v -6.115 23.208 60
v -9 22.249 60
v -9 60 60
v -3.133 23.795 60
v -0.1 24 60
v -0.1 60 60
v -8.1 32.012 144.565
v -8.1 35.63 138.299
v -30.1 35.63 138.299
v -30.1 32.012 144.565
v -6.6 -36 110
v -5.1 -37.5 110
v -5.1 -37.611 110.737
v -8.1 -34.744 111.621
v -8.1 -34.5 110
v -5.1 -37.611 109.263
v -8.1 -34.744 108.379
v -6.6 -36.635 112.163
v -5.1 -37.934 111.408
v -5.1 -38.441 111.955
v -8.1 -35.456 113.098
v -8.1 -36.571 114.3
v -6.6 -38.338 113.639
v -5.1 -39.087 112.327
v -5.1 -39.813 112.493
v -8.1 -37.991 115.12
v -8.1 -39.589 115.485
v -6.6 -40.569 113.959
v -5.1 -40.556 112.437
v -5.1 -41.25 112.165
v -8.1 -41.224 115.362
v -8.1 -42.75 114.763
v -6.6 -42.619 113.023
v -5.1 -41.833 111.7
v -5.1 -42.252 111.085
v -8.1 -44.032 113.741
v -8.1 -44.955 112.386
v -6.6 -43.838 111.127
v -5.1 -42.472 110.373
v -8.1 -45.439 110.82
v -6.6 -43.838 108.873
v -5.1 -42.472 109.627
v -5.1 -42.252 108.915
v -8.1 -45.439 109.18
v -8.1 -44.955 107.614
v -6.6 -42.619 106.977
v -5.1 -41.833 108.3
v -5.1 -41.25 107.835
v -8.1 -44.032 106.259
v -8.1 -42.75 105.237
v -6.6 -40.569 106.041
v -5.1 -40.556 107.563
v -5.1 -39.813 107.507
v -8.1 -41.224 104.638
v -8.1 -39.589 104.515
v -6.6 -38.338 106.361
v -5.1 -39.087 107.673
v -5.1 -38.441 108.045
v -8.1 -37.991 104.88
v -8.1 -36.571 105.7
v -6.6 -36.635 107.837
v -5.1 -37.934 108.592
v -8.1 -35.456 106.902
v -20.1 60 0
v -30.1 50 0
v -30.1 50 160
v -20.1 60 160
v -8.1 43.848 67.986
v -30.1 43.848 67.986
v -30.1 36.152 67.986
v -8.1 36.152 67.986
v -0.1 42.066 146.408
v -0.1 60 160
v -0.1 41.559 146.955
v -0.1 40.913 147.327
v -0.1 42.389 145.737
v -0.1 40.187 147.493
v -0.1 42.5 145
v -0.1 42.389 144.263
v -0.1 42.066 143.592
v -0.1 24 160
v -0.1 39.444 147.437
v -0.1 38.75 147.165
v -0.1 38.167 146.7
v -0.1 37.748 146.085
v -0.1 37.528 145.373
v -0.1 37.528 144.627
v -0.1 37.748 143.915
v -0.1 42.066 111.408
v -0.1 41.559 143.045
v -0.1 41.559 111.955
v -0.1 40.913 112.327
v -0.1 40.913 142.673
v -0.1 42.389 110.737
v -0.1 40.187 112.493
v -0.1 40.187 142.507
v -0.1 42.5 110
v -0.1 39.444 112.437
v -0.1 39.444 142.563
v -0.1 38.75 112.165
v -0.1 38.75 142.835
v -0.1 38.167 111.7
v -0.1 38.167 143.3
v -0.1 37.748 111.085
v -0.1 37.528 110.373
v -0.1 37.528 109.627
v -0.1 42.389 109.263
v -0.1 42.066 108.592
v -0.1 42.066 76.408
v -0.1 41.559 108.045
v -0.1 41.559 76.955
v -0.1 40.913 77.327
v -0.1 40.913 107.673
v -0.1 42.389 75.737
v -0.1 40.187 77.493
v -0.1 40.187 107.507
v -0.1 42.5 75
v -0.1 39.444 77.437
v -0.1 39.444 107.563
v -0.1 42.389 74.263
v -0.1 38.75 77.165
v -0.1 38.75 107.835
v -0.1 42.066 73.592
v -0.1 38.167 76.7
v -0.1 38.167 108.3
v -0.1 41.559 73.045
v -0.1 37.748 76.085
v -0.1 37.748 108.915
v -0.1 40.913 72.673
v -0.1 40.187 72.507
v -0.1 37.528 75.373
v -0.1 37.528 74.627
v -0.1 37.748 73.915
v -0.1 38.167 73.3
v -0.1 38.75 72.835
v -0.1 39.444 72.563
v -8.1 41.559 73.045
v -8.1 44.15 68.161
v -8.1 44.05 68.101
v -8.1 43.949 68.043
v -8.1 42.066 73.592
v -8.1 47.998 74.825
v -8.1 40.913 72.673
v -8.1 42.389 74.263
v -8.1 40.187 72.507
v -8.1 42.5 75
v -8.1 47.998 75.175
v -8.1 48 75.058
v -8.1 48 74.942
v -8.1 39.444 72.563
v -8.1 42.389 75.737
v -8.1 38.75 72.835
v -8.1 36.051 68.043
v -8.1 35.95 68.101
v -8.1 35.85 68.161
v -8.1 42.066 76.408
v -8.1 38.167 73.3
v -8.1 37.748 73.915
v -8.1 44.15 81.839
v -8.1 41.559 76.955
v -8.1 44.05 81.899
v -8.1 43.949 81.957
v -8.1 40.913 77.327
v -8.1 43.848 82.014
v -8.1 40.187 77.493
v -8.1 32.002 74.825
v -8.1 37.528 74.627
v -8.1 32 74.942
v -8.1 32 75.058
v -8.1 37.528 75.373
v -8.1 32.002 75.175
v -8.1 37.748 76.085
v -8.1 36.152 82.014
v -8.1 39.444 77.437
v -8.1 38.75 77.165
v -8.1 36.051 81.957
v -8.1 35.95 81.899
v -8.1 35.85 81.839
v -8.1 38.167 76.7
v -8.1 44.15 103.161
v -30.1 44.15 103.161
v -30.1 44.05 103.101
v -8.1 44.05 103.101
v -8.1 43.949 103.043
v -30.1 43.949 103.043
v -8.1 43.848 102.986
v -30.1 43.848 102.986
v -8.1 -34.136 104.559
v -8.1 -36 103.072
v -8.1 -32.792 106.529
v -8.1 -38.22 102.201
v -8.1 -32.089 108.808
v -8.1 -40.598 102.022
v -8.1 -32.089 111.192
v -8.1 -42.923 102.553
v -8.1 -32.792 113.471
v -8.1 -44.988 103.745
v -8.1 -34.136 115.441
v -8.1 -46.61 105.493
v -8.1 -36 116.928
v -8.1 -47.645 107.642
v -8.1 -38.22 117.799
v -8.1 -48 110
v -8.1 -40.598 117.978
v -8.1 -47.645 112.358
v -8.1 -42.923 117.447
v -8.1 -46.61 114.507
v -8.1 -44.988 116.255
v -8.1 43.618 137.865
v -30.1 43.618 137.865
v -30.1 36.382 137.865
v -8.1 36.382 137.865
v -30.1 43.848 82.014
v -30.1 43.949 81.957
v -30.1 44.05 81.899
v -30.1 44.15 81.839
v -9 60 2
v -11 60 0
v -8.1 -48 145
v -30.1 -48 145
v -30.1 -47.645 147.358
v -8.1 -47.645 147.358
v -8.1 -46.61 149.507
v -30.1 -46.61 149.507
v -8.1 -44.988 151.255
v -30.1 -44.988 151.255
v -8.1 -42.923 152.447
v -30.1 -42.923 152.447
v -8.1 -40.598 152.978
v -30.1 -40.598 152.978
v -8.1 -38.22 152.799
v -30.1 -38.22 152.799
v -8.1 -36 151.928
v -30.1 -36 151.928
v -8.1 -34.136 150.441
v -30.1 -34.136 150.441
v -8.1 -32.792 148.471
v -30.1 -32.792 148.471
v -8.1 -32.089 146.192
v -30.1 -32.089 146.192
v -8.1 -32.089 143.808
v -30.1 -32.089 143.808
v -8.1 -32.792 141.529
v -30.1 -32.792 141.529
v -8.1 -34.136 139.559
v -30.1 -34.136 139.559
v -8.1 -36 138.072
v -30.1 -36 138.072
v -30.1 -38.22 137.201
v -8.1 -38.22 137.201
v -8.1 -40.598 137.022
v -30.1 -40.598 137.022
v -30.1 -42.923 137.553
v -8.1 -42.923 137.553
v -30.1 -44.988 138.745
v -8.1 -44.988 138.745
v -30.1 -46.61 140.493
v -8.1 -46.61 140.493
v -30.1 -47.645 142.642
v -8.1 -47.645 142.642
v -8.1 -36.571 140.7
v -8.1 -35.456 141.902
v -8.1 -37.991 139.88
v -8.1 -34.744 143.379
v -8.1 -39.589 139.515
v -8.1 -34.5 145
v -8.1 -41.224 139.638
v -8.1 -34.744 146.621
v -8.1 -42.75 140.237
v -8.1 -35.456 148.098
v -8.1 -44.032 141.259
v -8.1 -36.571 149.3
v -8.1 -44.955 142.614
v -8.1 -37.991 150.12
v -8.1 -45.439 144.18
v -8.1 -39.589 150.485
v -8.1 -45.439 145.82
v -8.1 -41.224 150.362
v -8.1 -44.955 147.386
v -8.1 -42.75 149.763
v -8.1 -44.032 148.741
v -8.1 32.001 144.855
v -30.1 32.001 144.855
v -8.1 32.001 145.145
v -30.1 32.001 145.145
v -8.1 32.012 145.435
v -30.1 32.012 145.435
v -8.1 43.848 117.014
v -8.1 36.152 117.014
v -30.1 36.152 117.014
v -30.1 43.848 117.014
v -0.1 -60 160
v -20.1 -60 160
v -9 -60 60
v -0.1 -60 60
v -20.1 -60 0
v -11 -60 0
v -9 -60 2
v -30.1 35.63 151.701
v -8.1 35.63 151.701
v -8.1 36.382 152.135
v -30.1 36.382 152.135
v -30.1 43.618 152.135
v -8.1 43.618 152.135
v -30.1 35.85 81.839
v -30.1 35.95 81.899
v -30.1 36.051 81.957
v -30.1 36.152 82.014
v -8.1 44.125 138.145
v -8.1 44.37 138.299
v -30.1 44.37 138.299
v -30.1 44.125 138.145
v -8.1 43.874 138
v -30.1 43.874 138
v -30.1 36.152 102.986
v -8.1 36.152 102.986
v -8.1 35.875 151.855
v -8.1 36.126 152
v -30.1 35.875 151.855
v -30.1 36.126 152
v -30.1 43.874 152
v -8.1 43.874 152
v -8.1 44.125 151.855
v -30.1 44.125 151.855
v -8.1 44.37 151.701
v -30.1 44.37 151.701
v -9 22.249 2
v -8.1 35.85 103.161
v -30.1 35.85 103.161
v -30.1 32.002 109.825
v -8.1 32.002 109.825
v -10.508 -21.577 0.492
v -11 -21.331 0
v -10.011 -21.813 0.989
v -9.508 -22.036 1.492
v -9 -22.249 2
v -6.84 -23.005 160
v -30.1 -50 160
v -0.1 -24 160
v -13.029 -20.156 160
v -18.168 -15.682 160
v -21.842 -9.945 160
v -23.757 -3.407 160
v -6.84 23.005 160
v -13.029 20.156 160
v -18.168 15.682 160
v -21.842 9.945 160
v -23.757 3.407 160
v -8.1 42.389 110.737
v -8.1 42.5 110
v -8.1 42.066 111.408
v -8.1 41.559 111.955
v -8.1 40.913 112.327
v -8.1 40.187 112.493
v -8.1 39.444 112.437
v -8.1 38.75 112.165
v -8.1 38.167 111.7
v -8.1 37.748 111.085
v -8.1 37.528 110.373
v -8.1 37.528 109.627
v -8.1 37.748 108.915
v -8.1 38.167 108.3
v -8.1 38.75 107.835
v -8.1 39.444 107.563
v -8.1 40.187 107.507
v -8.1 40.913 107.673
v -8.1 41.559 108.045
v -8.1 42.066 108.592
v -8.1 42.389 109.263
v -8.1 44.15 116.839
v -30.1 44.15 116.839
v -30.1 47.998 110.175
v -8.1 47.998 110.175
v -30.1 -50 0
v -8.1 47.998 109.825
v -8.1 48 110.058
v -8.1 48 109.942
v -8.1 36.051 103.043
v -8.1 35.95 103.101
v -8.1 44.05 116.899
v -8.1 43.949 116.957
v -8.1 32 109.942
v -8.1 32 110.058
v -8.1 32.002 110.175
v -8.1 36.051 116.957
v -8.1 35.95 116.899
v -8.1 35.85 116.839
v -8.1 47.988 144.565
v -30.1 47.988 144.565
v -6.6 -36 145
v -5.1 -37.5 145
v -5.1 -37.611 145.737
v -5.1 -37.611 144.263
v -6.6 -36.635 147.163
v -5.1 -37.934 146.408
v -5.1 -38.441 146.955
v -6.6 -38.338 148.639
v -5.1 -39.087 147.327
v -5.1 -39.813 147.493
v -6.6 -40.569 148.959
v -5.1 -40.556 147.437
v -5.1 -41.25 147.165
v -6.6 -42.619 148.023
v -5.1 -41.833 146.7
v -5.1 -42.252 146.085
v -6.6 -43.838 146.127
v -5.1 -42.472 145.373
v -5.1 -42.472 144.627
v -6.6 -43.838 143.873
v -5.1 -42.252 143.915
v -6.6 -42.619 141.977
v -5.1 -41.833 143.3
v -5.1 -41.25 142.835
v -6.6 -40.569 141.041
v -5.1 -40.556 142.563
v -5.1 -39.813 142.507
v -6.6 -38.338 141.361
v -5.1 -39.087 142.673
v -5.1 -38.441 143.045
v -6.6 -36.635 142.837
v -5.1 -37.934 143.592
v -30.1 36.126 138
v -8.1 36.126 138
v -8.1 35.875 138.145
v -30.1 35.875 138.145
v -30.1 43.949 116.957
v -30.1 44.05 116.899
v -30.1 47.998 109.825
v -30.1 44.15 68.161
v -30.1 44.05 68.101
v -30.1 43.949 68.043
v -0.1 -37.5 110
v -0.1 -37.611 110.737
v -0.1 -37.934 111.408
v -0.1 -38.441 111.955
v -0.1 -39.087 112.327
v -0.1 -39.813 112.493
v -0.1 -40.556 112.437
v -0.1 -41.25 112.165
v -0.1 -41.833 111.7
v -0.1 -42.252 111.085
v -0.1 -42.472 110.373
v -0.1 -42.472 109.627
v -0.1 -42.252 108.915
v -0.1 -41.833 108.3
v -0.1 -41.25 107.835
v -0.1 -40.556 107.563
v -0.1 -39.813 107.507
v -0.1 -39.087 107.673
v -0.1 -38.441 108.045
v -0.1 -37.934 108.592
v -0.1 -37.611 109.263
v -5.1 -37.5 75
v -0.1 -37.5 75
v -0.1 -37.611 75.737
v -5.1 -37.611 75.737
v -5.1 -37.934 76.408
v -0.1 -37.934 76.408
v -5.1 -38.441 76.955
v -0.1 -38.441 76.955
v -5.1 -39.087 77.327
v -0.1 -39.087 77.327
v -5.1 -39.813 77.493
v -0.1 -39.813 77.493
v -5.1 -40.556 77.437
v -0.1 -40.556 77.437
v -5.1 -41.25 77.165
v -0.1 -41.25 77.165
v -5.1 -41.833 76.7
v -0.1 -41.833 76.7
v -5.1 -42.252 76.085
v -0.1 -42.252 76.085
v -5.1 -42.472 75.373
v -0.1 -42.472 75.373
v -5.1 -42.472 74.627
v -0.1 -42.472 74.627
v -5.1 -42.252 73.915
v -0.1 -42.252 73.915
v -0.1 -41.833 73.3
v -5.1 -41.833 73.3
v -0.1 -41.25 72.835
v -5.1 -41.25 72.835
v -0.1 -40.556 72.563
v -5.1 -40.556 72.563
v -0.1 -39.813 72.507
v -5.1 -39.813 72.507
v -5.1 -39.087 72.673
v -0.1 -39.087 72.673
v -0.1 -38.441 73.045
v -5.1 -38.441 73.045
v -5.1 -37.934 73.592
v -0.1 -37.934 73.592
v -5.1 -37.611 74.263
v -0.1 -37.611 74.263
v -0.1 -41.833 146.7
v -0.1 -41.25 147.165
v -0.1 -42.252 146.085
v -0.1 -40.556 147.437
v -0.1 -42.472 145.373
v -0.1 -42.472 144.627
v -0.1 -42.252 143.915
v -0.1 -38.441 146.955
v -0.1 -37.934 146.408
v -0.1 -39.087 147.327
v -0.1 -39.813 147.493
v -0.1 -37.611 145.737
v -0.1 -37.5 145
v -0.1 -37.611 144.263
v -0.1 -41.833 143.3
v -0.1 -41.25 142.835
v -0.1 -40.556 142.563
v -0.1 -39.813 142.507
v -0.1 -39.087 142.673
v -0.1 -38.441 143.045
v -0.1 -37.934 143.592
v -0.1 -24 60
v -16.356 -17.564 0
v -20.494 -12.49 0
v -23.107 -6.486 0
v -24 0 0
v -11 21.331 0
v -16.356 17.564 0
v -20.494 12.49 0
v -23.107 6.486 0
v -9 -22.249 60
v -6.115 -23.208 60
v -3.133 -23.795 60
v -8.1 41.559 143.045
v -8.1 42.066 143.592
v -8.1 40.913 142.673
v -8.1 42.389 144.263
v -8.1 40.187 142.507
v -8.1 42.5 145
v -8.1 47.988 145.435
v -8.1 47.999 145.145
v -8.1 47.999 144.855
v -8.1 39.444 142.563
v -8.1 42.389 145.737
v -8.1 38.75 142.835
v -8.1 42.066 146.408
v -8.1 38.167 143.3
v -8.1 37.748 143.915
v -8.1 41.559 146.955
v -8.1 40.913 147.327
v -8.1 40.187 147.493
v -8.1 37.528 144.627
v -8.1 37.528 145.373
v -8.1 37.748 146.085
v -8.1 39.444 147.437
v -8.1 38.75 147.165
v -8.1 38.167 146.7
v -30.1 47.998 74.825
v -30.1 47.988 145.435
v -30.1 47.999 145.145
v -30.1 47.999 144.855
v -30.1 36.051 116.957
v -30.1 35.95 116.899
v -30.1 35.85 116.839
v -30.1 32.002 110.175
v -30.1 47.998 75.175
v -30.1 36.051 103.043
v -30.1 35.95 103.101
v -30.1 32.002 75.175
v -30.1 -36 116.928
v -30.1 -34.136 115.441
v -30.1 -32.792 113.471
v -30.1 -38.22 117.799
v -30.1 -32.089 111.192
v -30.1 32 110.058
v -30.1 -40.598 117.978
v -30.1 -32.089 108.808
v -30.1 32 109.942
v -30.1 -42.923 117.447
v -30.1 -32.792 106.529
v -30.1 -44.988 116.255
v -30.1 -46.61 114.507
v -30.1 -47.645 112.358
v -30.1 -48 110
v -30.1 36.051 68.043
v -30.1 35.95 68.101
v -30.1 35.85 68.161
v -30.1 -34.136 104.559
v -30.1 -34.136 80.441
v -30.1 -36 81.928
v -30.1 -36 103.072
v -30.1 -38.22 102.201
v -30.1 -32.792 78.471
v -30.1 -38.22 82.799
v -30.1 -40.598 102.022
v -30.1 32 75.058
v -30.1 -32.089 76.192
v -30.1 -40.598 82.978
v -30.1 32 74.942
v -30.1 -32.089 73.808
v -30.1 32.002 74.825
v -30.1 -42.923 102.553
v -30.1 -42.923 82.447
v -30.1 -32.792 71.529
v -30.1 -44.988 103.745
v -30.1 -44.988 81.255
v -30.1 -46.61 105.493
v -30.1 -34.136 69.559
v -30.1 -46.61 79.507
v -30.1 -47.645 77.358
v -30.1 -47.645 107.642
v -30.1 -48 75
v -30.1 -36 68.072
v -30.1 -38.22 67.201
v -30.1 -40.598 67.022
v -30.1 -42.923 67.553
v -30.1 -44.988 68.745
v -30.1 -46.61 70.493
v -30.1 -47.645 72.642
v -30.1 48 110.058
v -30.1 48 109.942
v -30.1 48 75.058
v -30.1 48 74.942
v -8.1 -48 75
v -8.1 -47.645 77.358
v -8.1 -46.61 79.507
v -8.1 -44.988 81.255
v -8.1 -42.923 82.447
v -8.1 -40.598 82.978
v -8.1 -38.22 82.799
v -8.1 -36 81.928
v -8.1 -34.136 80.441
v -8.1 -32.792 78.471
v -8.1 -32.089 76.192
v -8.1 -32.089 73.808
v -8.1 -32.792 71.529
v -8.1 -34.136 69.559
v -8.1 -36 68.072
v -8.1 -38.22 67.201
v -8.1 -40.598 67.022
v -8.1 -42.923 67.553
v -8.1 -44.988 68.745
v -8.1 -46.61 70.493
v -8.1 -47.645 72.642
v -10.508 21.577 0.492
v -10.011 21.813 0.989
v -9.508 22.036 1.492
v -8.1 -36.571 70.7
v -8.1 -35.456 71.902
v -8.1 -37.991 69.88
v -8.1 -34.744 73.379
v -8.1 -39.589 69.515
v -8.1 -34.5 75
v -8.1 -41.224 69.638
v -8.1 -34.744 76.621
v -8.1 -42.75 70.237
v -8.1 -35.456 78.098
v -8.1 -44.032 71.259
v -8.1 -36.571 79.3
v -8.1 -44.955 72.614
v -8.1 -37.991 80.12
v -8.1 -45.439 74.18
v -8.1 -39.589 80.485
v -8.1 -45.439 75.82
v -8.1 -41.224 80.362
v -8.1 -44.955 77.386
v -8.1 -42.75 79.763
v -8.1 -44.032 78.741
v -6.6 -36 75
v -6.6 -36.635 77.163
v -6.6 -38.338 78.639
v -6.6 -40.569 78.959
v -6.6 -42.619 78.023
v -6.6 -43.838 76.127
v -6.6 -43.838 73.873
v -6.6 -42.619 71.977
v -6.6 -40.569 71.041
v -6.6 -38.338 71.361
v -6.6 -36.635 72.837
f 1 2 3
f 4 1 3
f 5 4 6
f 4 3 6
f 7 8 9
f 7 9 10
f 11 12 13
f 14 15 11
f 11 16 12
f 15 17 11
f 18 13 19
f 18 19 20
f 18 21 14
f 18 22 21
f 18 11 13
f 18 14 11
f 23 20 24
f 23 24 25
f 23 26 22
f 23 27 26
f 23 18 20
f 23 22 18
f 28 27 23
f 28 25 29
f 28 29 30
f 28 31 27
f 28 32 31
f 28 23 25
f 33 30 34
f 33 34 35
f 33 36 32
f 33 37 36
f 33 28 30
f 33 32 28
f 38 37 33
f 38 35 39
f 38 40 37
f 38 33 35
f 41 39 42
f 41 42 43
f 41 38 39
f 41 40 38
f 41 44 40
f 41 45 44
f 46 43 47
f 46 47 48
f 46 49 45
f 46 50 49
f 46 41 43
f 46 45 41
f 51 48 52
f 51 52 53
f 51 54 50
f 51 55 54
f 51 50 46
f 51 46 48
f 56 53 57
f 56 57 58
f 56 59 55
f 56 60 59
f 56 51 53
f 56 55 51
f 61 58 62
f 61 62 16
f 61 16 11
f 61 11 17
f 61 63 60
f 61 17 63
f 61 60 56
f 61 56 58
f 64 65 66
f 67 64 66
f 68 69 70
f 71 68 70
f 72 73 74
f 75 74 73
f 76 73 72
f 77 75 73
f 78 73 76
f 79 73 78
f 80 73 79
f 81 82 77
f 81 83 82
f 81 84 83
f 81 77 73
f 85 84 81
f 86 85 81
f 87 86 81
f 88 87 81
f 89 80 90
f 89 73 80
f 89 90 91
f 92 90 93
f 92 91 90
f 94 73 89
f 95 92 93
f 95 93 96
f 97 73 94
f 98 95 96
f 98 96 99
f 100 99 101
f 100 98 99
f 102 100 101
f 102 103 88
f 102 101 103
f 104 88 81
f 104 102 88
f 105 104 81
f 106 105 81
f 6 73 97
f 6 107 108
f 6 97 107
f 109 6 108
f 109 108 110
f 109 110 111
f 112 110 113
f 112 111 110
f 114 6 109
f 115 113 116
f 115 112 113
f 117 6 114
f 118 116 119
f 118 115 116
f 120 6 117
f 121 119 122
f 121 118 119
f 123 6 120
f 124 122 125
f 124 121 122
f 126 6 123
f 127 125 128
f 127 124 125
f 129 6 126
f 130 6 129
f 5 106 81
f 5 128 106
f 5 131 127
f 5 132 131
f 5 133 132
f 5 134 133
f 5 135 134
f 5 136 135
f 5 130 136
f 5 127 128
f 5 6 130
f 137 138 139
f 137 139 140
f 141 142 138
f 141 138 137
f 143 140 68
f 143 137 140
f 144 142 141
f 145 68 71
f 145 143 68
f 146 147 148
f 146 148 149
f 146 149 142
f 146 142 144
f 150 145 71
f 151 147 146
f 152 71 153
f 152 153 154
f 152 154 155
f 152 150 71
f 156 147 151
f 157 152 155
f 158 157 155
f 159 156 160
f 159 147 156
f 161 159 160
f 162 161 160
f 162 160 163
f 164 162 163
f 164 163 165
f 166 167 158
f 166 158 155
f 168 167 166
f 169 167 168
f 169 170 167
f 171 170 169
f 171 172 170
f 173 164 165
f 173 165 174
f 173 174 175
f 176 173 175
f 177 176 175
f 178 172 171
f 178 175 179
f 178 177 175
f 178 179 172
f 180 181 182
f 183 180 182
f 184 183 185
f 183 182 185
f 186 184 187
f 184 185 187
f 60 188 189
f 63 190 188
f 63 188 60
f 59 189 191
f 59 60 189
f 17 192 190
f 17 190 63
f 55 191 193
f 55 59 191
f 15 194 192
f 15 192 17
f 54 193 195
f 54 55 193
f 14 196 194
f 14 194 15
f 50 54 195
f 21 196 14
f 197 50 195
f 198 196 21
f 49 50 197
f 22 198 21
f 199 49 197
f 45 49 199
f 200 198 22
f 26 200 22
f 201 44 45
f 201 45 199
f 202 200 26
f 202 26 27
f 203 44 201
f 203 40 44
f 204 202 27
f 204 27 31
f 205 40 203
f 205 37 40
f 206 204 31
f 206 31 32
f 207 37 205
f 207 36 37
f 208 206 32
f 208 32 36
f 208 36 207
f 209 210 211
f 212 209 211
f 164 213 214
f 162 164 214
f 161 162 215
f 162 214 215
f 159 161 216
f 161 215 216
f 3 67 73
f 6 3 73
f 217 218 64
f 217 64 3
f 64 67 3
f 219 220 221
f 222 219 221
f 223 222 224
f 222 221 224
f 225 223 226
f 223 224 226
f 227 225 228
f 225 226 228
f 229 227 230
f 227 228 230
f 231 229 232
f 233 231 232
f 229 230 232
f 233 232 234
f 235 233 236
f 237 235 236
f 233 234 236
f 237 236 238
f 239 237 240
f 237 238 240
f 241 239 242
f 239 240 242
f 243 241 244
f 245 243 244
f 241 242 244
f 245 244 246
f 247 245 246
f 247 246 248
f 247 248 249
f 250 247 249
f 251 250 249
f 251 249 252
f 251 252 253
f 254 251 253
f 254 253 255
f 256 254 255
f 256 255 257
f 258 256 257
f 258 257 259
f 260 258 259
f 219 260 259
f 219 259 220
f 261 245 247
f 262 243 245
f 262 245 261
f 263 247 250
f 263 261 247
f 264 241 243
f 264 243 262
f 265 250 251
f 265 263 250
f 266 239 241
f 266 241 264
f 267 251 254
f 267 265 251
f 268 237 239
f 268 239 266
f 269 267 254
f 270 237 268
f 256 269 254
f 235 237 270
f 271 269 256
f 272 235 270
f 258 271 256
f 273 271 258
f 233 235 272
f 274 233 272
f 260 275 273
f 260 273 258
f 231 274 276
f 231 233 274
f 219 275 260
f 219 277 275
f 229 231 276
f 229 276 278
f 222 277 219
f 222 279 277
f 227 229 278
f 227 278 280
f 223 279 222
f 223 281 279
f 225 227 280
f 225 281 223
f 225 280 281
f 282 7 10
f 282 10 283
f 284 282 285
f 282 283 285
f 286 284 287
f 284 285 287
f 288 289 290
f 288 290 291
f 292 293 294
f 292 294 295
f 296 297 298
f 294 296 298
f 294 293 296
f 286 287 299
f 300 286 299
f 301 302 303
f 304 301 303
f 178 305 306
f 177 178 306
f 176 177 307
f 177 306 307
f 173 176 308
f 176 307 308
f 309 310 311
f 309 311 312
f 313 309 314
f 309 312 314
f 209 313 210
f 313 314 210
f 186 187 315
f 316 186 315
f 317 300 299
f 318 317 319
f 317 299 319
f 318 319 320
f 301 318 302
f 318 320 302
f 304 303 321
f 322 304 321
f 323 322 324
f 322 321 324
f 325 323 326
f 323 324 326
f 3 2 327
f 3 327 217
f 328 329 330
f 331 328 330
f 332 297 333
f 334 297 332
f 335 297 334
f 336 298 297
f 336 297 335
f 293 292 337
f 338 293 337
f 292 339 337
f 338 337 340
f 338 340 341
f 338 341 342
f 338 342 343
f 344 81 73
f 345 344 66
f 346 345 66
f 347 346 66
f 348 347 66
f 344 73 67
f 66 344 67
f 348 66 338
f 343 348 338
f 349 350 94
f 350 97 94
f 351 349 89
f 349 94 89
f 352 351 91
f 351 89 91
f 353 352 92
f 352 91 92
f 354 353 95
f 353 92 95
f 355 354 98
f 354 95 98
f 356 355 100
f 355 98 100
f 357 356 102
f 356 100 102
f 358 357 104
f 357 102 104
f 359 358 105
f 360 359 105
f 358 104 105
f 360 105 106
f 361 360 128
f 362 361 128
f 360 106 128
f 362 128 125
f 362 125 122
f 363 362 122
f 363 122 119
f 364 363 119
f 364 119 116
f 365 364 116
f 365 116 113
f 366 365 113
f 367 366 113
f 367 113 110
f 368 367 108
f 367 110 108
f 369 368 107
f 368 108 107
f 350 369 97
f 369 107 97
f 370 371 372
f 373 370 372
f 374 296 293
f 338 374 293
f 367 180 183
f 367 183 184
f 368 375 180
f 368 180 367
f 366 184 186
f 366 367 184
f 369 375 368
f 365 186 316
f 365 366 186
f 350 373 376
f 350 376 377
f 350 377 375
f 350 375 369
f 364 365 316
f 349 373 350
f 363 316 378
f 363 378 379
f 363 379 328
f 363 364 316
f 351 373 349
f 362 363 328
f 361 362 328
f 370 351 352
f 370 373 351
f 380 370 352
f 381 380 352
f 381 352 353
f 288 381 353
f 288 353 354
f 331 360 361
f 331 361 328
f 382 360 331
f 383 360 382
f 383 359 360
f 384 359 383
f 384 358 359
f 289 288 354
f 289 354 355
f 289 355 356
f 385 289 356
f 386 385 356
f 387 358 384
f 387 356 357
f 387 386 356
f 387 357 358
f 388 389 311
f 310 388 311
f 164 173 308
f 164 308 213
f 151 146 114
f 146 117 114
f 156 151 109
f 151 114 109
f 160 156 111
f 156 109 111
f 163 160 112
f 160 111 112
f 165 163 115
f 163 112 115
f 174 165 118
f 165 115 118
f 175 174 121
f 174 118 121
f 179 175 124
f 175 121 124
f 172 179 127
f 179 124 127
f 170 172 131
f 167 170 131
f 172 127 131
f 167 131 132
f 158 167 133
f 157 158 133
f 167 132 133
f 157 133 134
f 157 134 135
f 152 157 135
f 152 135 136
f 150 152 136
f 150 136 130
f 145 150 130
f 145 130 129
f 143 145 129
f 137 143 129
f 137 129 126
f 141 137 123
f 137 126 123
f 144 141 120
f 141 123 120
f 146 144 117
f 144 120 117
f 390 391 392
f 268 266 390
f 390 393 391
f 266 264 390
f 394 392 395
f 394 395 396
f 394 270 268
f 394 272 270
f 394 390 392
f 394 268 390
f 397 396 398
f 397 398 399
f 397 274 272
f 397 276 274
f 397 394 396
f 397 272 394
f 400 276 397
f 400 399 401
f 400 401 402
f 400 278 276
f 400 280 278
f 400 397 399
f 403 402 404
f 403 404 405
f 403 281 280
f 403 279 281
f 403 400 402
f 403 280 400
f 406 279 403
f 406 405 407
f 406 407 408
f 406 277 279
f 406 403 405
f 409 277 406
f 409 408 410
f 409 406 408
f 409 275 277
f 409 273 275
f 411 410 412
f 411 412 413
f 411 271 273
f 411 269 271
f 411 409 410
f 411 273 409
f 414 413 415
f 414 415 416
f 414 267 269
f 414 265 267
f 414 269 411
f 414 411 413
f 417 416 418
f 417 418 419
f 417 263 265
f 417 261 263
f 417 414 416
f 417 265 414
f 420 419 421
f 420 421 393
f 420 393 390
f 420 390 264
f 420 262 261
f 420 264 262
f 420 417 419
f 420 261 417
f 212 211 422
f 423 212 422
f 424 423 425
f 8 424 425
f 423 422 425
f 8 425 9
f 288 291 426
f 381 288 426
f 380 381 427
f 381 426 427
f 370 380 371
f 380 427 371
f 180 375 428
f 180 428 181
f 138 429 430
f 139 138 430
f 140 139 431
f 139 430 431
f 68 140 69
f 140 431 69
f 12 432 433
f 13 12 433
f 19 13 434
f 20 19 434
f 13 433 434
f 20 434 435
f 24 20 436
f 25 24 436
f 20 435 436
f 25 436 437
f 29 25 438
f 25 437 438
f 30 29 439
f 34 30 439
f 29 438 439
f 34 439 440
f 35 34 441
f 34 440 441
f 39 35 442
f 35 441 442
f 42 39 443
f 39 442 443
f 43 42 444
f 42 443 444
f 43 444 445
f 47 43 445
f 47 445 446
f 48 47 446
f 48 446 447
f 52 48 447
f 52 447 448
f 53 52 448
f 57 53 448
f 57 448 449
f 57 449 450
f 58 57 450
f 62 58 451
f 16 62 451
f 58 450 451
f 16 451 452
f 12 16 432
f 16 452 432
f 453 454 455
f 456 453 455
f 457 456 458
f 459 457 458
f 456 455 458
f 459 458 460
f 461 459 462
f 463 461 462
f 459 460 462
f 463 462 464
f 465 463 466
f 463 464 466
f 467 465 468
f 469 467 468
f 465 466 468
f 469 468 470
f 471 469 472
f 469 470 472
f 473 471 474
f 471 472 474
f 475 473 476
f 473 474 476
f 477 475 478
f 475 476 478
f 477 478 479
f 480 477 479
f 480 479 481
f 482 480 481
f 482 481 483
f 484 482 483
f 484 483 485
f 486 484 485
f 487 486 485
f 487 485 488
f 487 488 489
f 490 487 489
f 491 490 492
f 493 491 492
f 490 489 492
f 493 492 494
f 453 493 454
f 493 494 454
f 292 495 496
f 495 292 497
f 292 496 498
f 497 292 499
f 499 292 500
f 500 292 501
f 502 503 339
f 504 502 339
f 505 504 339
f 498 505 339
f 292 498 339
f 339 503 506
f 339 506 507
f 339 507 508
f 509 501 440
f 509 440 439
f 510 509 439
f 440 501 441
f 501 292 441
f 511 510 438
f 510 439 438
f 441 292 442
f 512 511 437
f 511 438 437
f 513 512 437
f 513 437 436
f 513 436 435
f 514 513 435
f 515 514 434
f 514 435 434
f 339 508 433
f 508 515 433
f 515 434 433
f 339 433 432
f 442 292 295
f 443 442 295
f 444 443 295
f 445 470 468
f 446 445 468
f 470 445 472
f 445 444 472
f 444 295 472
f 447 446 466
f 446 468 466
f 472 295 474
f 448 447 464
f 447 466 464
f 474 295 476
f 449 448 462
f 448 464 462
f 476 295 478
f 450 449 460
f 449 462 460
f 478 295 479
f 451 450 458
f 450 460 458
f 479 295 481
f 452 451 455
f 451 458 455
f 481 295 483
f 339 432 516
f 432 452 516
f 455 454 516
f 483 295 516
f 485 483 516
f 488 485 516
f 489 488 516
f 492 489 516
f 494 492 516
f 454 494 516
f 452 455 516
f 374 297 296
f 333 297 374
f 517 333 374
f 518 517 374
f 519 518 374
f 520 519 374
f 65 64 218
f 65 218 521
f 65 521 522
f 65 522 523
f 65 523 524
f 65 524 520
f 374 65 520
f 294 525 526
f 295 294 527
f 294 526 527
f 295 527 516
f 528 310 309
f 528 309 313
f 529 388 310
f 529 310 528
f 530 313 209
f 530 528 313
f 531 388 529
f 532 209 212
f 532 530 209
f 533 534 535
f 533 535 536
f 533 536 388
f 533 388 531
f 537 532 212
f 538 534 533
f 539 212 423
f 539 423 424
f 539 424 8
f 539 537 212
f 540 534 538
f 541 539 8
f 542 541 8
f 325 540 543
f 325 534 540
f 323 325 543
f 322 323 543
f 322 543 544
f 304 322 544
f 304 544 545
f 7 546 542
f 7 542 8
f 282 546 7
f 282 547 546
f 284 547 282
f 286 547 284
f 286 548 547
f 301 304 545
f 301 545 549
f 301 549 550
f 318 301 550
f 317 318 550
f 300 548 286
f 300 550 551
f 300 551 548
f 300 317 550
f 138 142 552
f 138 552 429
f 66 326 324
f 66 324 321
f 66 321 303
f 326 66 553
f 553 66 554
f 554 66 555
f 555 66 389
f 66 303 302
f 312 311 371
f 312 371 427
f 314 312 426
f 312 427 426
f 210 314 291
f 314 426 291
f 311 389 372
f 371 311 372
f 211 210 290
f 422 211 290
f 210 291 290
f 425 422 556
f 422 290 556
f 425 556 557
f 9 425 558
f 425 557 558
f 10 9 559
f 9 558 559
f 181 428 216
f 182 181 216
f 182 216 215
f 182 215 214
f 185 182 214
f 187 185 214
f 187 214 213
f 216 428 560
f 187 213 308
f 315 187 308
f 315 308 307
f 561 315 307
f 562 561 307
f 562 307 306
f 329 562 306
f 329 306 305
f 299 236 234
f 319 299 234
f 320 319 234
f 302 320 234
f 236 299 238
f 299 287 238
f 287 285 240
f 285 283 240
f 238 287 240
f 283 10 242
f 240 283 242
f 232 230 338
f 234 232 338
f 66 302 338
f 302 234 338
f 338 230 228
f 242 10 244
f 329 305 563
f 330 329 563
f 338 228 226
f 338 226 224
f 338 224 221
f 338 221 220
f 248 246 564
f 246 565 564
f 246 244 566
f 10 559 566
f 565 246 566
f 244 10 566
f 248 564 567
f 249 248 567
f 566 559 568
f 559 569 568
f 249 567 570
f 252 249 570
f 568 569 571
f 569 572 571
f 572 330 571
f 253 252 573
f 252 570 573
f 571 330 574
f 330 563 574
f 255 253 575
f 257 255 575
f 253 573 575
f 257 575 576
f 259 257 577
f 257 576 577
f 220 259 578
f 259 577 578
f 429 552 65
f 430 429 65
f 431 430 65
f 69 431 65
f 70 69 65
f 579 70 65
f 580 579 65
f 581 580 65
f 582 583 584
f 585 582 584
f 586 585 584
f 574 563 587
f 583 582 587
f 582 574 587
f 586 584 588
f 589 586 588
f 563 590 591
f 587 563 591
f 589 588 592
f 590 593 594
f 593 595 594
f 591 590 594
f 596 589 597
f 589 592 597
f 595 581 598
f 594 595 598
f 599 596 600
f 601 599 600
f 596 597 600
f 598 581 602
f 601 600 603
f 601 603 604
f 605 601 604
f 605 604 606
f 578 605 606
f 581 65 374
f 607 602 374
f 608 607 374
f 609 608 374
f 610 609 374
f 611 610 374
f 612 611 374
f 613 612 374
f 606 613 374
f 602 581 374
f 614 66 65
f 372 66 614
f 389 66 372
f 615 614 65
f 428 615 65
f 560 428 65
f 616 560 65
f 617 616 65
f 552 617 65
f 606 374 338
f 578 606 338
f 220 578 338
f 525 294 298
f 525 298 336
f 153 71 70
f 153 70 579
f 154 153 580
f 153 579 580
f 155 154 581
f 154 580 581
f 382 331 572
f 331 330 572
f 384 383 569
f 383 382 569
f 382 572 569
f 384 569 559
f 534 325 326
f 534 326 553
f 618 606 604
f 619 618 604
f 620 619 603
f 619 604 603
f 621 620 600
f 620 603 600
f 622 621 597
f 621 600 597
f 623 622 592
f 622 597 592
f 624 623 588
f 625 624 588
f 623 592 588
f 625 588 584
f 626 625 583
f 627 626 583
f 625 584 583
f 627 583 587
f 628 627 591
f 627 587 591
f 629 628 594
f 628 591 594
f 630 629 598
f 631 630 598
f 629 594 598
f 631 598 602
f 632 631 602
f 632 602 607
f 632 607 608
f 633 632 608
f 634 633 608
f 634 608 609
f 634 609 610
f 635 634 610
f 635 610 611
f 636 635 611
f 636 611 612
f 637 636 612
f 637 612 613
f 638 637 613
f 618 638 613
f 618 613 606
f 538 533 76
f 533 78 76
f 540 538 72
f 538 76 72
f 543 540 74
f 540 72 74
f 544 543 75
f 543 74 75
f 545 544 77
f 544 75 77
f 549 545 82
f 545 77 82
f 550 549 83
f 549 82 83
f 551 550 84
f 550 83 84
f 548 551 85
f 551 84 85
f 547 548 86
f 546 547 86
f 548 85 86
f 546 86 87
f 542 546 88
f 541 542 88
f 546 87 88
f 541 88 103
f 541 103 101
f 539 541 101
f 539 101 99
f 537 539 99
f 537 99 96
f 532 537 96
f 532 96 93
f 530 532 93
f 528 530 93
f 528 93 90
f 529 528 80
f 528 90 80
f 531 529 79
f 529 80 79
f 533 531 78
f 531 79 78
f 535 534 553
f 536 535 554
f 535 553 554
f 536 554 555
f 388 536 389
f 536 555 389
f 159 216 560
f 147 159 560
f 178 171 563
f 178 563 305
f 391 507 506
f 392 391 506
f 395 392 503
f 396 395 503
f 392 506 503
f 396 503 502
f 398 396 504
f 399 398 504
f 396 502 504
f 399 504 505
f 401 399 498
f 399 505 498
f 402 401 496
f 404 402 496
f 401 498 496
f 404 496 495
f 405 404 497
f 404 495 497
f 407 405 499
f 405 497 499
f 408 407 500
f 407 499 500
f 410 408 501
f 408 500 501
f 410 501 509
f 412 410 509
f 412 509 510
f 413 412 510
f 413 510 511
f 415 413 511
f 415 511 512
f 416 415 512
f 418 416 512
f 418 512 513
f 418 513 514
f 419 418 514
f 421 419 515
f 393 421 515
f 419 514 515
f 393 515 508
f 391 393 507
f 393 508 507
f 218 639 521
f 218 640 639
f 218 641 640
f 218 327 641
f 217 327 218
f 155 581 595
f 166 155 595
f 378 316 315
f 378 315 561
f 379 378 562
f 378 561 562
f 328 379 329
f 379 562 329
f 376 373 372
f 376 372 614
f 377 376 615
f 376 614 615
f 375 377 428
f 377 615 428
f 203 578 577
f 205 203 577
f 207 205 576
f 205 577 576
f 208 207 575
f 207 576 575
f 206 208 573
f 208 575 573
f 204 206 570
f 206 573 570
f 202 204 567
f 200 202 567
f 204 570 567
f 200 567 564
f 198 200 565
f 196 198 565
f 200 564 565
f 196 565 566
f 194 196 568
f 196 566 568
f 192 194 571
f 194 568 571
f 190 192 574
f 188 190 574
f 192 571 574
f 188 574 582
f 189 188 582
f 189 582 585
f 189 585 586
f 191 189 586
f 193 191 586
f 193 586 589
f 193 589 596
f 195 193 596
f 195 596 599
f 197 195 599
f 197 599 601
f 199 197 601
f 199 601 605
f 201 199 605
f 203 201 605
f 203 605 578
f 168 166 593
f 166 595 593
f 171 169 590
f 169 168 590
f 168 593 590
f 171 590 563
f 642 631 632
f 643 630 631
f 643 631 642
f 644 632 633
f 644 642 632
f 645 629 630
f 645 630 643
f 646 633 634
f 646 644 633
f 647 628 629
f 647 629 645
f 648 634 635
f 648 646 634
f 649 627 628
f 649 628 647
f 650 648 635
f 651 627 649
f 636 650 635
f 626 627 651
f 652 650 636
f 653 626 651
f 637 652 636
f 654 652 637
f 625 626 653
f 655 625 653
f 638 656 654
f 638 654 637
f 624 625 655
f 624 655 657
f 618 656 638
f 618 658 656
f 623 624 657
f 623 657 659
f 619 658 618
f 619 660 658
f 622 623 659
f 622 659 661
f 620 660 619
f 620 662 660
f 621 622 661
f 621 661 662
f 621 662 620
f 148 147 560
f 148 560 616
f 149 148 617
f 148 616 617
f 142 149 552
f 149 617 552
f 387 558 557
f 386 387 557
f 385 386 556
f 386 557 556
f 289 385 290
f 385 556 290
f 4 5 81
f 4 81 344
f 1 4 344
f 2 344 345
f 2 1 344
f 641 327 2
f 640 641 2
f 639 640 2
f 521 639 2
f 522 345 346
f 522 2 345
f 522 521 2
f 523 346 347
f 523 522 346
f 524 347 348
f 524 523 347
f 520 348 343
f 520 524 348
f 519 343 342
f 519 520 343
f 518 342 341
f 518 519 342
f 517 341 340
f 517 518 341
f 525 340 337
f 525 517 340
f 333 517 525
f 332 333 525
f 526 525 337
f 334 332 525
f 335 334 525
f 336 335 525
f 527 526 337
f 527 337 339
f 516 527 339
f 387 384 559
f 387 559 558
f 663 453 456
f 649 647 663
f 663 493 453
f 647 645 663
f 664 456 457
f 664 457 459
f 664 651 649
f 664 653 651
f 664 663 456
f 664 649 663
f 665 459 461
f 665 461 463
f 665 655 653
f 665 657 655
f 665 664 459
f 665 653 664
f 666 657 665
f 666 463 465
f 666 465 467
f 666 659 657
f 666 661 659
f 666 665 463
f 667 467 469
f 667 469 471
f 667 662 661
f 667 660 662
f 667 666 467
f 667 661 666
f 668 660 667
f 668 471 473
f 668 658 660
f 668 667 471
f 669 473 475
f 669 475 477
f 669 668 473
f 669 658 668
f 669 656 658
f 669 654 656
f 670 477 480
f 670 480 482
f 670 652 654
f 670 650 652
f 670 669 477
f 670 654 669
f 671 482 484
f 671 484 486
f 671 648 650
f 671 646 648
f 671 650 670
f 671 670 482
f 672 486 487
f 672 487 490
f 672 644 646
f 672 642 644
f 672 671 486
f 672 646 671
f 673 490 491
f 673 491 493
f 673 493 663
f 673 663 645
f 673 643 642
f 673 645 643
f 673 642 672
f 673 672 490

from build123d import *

# Parameters (mm, degrees)
PAD_DEPTH        = 160
SKETCH001_W      = 9
SKETCH001_H      = 172.193062
POCKET_DEPTH     = 60
CHAMFER_SIZE     = 10
CHAMFER001_SIZE  = 2
HOLE_D           = 5
HOLE_CBORE_D     = 16
HOLE_CBORE_DEPTH = 22
SKETCH003_R      = 8.5
PAD001_DEPTH     = 22
CHAMFER002_SIZE  = 3


with BuildPart() as part:
    # Sketch → Pad (new body)
    with BuildSketch(Plane.XY):
        with BuildLine():
            ThreePointArc((-0.1, 23.999792), (-24, 0), (-0.1, -23.999792))
            Line((-0.1, -60), (-0.1, -23.999792))
            Line((-30.1, -60), (-0.1, -60))
            Line((-30.1, 60), (-30.1, -60))
            Line((-30.1, 60), (-0.1, 60))
            Line((-0.1, 60), (-0.1, 23.999792))
        make_face()
    extrude(amount=PAD_DEPTH)

    # Sketch001 → Pocket (cut)
    with BuildSketch(Plane.XY):
        with Locations((-4.5, 7.136196)):
            Rectangle(SKETCH001_W, SKETCH001_H)
    extrude(amount=POCKET_DEPTH, mode=Mode.SUBTRACT)

    # Chamfer
    chamfer_edges = [part.edges().sort_by_distance(p)[0] for p in [
        (-30.1, 60, 80),
        (-30.1, -60, 80),
    ]]
    chamfer(chamfer_edges, length=CHAMFER_SIZE)

    # Chamfer001
    chamfer001_edges = [part.edges().sort_by_distance(p)[0] for p in [
        (-9, -41.124298, 0),
        (-9, 41.124298, 0),
    ]]
    chamfer(chamfer001_edges, length=CHAMFER001_SIZE)

    # Hole (through all)
    with Locations(Plane(origin=(-30.1, 0, 0), x_dir=(0, -1, 0), z_dir=(-1, 0, 0))):
        with Locations((-40, 145), (-40, 75), (40, 145), (40, 75), (-40, 110), (40, 110)):
            CounterBoreHole(HOLE_D / 2, HOLE_CBORE_D / 2, HOLE_CBORE_DEPTH)

    # Sketch003 (on Face30 of Hole) → Pad001 (join)
    with BuildSketch(Plane(origin=(-8.1, 0, 0), x_dir=(0, -1, 0), z_dir=(-1, 0, 0))):
        with Locations((-40, 110)):
            Circle(SKETCH003_R)
        Polygon((-35.950555, 102.986156), (-31.90111, 110), (-35.950555, 117.013844), (-44.049445, 117.013844), (-48.09889, 110), (-44.049445, 102.986156), align=None, mode=Mode.SUBTRACT)
        with Locations((-40, 75)):
            Circle(SKETCH003_R)
        Polygon((-35.950555, 67.986156), (-31.90111, 75), (-35.950555, 82.013844), (-44.049445, 82.013844), (-48.09889, 75), (-44.049445, 67.986156), align=None, mode=Mode.SUBTRACT)
        with Locations((-40, 145)):
            Circle(SKETCH003_R)
        Polygon((-35.880447, 137.864725), (-31.760895, 145), (-35.880447, 152.135275), (-44.119553, 152.135275), (-48.239105, 145), (-44.119553, 137.864725), align=None, mode=Mode.SUBTRACT)
    extrude(amount=PAD001_DEPTH)

    # Chamfer002
    chamfer002_edges = [part.edges().sort_by_distance(p)[0] for p in [
        (-8.1, -40, 72.5),
        (-8.1, -40, 142.5),
        (-8.1, -40, 107.5),
    ]]
    chamfer(chamfer002_edges, length=CHAMFER002_SIZE)


solid = part.part
